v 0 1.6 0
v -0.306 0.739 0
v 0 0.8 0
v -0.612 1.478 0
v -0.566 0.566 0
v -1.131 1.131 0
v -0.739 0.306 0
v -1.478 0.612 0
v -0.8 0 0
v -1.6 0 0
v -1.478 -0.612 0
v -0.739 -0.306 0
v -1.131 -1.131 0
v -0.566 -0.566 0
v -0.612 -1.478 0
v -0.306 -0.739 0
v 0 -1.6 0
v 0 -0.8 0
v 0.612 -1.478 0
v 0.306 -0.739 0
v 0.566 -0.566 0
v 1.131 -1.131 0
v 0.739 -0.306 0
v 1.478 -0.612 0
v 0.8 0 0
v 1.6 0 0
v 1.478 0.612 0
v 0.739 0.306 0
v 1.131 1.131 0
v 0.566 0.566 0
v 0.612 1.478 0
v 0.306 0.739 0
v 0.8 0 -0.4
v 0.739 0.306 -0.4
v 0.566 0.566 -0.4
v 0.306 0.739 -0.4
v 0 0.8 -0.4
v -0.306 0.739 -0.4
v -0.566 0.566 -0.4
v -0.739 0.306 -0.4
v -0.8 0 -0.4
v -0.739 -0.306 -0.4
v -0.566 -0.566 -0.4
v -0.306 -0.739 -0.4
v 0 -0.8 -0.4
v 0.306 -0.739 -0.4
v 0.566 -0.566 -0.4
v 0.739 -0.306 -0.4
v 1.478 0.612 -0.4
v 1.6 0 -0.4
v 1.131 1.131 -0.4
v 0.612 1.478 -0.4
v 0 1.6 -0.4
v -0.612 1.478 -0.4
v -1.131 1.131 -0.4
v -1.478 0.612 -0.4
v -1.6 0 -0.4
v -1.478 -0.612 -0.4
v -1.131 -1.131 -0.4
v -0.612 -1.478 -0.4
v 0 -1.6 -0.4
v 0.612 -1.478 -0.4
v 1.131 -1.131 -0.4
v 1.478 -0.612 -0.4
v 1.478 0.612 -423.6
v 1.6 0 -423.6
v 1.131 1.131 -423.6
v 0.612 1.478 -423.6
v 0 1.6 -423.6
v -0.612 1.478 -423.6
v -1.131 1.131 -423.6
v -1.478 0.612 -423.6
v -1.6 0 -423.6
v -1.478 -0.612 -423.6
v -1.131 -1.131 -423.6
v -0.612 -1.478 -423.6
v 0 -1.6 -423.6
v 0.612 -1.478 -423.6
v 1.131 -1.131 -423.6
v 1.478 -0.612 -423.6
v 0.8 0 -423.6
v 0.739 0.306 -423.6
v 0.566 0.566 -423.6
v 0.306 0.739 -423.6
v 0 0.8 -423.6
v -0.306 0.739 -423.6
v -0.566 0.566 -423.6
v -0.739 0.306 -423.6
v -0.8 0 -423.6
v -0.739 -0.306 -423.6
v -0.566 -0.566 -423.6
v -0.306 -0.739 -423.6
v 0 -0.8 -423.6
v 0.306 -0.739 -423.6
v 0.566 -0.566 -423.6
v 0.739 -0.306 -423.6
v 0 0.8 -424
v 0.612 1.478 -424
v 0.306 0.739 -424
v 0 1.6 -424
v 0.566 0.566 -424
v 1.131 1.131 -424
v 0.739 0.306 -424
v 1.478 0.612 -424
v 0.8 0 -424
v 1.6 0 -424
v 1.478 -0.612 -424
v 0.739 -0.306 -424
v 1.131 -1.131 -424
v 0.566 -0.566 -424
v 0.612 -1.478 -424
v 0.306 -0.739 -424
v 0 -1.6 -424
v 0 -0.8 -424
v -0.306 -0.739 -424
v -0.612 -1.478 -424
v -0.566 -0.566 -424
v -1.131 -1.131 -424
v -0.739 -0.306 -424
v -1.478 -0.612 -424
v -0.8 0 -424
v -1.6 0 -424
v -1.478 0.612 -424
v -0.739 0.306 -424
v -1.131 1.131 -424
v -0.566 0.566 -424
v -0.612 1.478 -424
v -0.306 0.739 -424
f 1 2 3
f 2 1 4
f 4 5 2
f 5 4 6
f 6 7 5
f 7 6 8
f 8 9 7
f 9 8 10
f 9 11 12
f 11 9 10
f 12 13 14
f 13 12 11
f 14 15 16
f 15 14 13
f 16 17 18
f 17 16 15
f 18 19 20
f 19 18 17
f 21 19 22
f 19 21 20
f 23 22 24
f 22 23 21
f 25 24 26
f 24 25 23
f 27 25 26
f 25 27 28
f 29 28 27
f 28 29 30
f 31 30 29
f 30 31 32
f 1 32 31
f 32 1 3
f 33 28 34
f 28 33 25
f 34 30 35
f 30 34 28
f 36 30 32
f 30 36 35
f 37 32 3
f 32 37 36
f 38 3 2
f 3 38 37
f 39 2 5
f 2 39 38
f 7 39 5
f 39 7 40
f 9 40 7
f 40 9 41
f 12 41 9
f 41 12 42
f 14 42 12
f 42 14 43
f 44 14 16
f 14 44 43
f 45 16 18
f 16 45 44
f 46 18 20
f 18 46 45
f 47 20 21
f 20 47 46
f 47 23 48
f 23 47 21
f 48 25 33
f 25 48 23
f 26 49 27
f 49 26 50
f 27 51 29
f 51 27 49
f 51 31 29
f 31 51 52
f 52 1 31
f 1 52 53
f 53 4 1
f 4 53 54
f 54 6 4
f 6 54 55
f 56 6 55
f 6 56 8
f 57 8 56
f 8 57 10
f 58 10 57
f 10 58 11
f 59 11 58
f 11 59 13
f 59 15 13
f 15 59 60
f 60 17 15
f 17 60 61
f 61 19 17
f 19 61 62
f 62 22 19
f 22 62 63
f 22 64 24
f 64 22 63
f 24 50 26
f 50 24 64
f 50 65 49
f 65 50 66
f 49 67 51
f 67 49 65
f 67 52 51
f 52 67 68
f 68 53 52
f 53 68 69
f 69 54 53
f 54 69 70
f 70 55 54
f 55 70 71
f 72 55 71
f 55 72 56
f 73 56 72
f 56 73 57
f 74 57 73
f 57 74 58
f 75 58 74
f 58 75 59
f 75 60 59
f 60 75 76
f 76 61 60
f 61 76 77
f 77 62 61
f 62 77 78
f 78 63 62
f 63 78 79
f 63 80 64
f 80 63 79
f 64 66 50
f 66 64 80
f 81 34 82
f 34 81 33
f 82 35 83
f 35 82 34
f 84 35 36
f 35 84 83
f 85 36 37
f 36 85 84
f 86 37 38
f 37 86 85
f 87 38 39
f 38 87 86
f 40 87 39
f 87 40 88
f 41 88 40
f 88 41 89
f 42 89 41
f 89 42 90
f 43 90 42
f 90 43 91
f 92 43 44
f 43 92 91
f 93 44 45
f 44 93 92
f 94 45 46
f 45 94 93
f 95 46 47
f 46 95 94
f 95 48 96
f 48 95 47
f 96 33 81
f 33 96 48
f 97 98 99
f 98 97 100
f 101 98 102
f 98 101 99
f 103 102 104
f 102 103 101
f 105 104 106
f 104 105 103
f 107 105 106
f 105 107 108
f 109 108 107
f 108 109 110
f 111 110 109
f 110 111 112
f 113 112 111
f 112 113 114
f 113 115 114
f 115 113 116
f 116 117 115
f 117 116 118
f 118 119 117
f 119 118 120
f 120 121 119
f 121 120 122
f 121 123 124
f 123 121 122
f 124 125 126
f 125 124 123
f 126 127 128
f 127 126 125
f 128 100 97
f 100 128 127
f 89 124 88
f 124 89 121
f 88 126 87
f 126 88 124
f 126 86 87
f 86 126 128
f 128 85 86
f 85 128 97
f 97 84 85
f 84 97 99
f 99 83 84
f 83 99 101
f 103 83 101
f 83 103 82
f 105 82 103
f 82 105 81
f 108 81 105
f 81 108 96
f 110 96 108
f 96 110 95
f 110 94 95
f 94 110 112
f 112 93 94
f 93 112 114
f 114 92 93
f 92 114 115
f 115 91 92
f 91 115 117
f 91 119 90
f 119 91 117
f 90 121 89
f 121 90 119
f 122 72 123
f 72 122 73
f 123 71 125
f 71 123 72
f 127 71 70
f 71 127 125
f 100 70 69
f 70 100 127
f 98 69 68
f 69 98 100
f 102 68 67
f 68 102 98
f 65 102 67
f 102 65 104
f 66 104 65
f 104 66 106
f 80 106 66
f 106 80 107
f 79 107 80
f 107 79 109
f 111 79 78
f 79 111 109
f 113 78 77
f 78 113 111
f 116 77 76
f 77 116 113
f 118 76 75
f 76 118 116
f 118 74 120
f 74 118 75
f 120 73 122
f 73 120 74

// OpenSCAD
// file: ../p/4-4ring1.scad
use <../lib.scad>
function ldraw_lib__4_4ring1() = [
// 0 Ring  1 x 1.0
// 0 Name: 4-4ring1.dat
// 0 Author: James Jessiman
// 0 !LDRAW_ORG Primitive UPDATE 2009-01
// 0 !LICENSE Licensed under CC BY 2.0 and CC BY 4.0 : see CAreadme.txt
// 
// 0 BFC CERTIFY CCW
  [0,"BFC","CERTIFY"],
  [0,"BFC","CCW"],
// 
// 0 !HISTORY 1998-12-15 [PTadmin] Official Update 1998-10
// 0 !HISTORY 2002-04-08 [BrickCaster] Modified for BFC compliance
// 0 !HISTORY 2002-04-25 [PTadmin] Official Update 2002-02
// 0 !HISTORY 2007-06-24 [PTadmin] Header formatted for Contributor Agreement
// 0 !HISTORY 2008-07-01 [PTadmin] Official Update 2008-01
// 0 !HISTORY 2008-08-26 [cwdee] Switch polygon winding and rename
// 0 !HISTORY 2009-05-02 [PTadmin] Official Update 2009-01
// 
// 
// 4 16 -0.7654 0 1.8478 -0.3827 0 0.9239 0 0 1 0 0 2
  [4,16,-0.7654,0,1.8478,-0.3827,0,0.9239,0,0,1,0,0,2],
// 4 16 -1.4142 0 1.4142 -0.7071 0 0.7071 -0.3827 0 0.9239 -0.7654 0 1.8478
  [4,16,-1.4142,0,1.4142,-0.7071,0,0.7071,-0.3827,0,0.9239,-0.7654,0,1.8478],
// 4 16 -1.8478 0 0.7654 -0.9239 0 0.3827 -0.7071 0 0.7071 -1.4142 0 1.41420
  [4,16,-1.8478,0,0.7654,-0.9239,0,0.3827,-0.7071,0,0.7071,-1.4142,0,1.41420],
// 4 16 -2 0 0 -1 0 0 -0.9239 0 0.3827 -1.8478 0 0.7654
  [4,16,-2,0,0,-1,0,0,-0.9239,0,0.3827,-1.8478,0,0.7654],
// 4 16 -1.8478 0 -0.7654 -0.9239 0 -0.3827 -1 0 0 -2 0 0
  [4,16,-1.8478,0,-0.7654,-0.9239,0,-0.3827,-1,0,0,-2,0,0],
// 4 16 -1.4142 0 -1.4142 -0.7071 0 -0.7071 -0.9239 0 -0.3827 -1.8478 0 -0.7654
  [4,16,-1.4142,0,-1.4142,-0.7071,0,-0.7071,-0.9239,0,-0.3827,-1.8478,0,-0.7654],
// 4 16 -0.7654 0 -1.8478 -0.3827 0 -0.9239 -0.7071 0 -0.7071 -1.4142 0 -1.4142
  [4,16,-0.7654,0,-1.8478,-0.3827,0,-0.9239,-0.7071,0,-0.7071,-1.4142,0,-1.4142],
// 4 16 0 0 -2 0 0 -1 -0.3827 0 -0.9239 -0.7654 0 -1.8478
  [4,16,0,0,-2,0,0,-1,-0.3827,0,-0.9239,-0.7654,0,-1.8478],
// 4 16 0.7654 0 -1.8478 0.3827 0 -0.9239 0 0 -1 0 0 -2
  [4,16,0.7654,0,-1.8478,0.3827,0,-0.9239,0,0,-1,0,0,-2],
// 4 16 1.4142 0 -1.4142 0.7071 0 -0.7071 0.3827 0 -0.9239 0.7654 0 -1.8478
  [4,16,1.4142,0,-1.4142,0.7071,0,-0.7071,0.3827,0,-0.9239,0.7654,0,-1.8478],
// 4 16 1.8478 0 -0.7654 0.9239 0 -0.3827 0.7071 0 -0.7071 1.4142 0 -1.4142
  [4,16,1.8478,0,-0.7654,0.9239,0,-0.3827,0.7071,0,-0.7071,1.4142,0,-1.4142],
// 4 16 2 0 0 1 0 0 0.9239 0 -0.3827 1.8478 0 -0.7654
  [4,16,2,0,0,1,0,0,0.9239,0,-0.3827,1.8478,0,-0.7654],
// 4 16 1.8478 0 0.7654 0.9239 0 0.3827 1 0 0 2 0 0
  [4,16,1.8478,0,0.7654,0.9239,0,0.3827,1,0,0,2,0,0],
// 4 16 1.4142 0 1.4142 0.7071 0 0.7071 0.9239 0 0.3827 1.8478 0 0.7654
  [4,16,1.4142,0,1.4142,0.7071,0,0.7071,0.9239,0,0.3827,1.8478,0,0.7654],
// 4 16 0.7654 0 1.8478 0.3827 0 0.9239 0.7071 0 0.7071 1.4142 0 1.4142
  [4,16,0.7654,0,1.8478,0.3827,0,0.9239,0.7071,0,0.7071,1.4142,0,1.4142],
// 4 16 0 0 2 0 0 1 0.3827 0 0.9239 0.7654 0 1.8478
  [4,16,0,0,2,0,0,1,0.3827,0,0.9239,0.7654,0,1.8478],
// 0
];
module ldraw_lib__4_4ring1(step=0, col=false, unit=2/5, alt=false, line=0.2, solid=!$preview)
    makepoly(ldraw_lib__4_4ring1(), step=step, col=col, unit=unit, alt=alt, line=line, solid=solid);
ldraw_lib__4_4ring1(line=0.2);
// file: ../p/4-4edge.scad
use <../lib.scad>
function ldraw_lib__4_4edge() = [
// 0 Circle 1.0
// 0 Name: 4-4edge.dat
// 0 Author: James Jessiman
// 0 !LDRAW_ORG Primitive UPDATE 2017-01
// 0 !LICENSE Licensed under CC BY 2.0 and CC BY 4.0 : see CAreadme.txt
// 
// 0 BFC CERTIFY CCW
  [0,"BFC","CERTIFY"],
  [0,"BFC","CCW"],
// 
// 0 !HISTORY 1998-12-15 [PTadmin] Official Update 1998-10
// 0 !HISTORY 2005-12-28 [PTadmin] Official Update 2005-01
// 0 !HISTORY 2007-06-24 [PTadmin] Header formatted for Contributor Agreement
// 0 !HISTORY 2008-07-01 [PTadmin] Official Update 2008-01
// 0 !HISTORY 2017-01-15 [Steffen] BFCed
// 0 !HISTORY 2017-12-30 [PTadmin] Official Update 2017-01
// 
// 
// 2 24 1 0 0 0.9239 0 0.3827
  [2,24,1,0,0,0.9239,0,0.3827],
// 2 24 0.9239 0 0.3827 0.7071 0 0.7071
  [2,24,0.9239,0,0.3827,0.7071,0,0.7071],
// 2 24 0.7071 0 0.7071 0.3827 0 0.9239
  [2,24,0.7071,0,0.7071,0.3827,0,0.9239],
// 2 24 0.3827 0 0.9239 0 0 1
  [2,24,0.3827,0,0.9239,0,0,1],
// 2 24 0 0 1 -0.3827 0 0.9239
  [2,24,0,0,1,-0.3827,0,0.9239],
// 2 24 -0.3827 0 0.9239 -0.7071 0 0.7071
  [2,24,-0.3827,0,0.9239,-0.7071,0,0.7071],
// 2 24 -0.7071 0 0.7071 -0.9239 0 0.3827
  [2,24,-0.7071,0,0.7071,-0.9239,0,0.3827],
// 2 24 -0.9239 0 0.3827 -1 0 -0
  [2,24,-0.9239,0,0.3827,-1,0,-0],
// 2 24 -1 0 -0 -0.9239 0 -0.3827
  [2,24,-1,0,-0,-0.9239,0,-0.3827],
// 2 24 -0.9239 0 -0.3827 -0.7071 0 -0.7071
  [2,24,-0.9239,0,-0.3827,-0.7071,0,-0.7071],
// 2 24 -0.7071 0 -0.7071 -0.3827 0 -0.9239
  [2,24,-0.7071,0,-0.7071,-0.3827,0,-0.9239],
// 2 24 -0.3827 0 -0.9239 0 0 -1
  [2,24,-0.3827,0,-0.9239,0,0,-1],
// 2 24 0 0 -1 0.3827 0 -0.9239
  [2,24,0,0,-1,0.3827,0,-0.9239],
// 2 24 0.3827 0 -0.9239 0.7071 0 -0.7071
  [2,24,0.3827,0,-0.9239,0.7071,0,-0.7071],
// 2 24 0.7071 0 -0.7071 0.9239 0 -0.3827
  [2,24,0.7071,0,-0.7071,0.9239,0,-0.3827],
// 2 24 0.9239 0 -0.3827 1 0 0
  [2,24,0.9239,0,-0.3827,1,0,0],
];
module ldraw_lib__4_4edge(step=0, col=false, unit=2/5, alt=false, line=0.2, solid=!$preview)
    makepoly(ldraw_lib__4_4edge(), step=step, col=col, unit=unit, alt=alt, line=line, solid=solid);
ldraw_lib__4_4edge(line=0.2);
// file: ../p/4-4cyli.scad
use <../lib.scad>
function ldraw_lib__4_4cyli() = [
// 0 Cylinder 1.0
// 0 Name: 4-4cyli.dat
// 0 Author: James Jessiman
// 0 !LDRAW_ORG Primitive UPDATE 2005-01
// 0 !LICENSE Licensed under CC BY 2.0 and CC BY 4.0 : see CAreadme.txt
// 
// 0 BFC CERTIFY CCW
  [0,"BFC","CERTIFY"],
  [0,"BFC","CCW"],
// 
// 0 !HISTORY 1998-12-15 [PTadmin] Official Update 1998-10
// 0 !HISTORY 2002-03-23 [sbliss] Added BFC statement; merged headers from files in distributions LDraw 0.27 and Complete.
// 0 !HISTORY 2002-04-25 [PTadmin] Official Update 2002-02
// 0 !HISTORY 2004-12-14 [guyvivan] BFC CCW
// 0 !HISTORY 2005-12-28 [PTadmin] Official Update 2005-01
// 0 !HISTORY 2007-06-24 [PTadmin] Header formatted for Contributor Agreement
// 0 !HISTORY 2008-07-01 [PTadmin] Official Update 2008-01
// 
// 
// 4 16 1 1 0 0.9239 1 0.3827 0.9239 0 0.3827 1 0 0
  [4,16,1,1,0,0.9239,1,0.3827,0.9239,0,0.3827,1,0,0],
// 5 24 1 0 0 1 1 0 0.9239 0 0.3827 0.9239 0 -0.3827
  [5,24,1,0,0,1,1,0,0.9239,0,0.3827,0.9239,0,-0.3827],
// 4 16 0.9239 1 0.3827 0.7071 1 0.7071 0.7071 0 0.7071 0.9239 0 0.3827
  [4,16,0.9239,1,0.3827,0.7071,1,0.7071,0.7071,0,0.7071,0.9239,0,0.3827],
// 5 24 0.9239 0 0.3827 0.9239 1 0.3827 0.7071 0 0.7071 1 0 0
  [5,24,0.9239,0,0.3827,0.9239,1,0.3827,0.7071,0,0.7071,1,0,0],
// 4 16 0.7071 1 0.7071 0.3827 1 0.9239 0.3827 0 0.9239 0.7071 0 0.7071
  [4,16,0.7071,1,0.7071,0.3827,1,0.9239,0.3827,0,0.9239,0.7071,0,0.7071],
// 5 24 0.7071 0 0.7071 0.7071 1 0.7071 0.3827 0 0.9239 0.9239 0 0.3827
  [5,24,0.7071,0,0.7071,0.7071,1,0.7071,0.3827,0,0.9239,0.9239,0,0.3827],
// 4 16 0.3827 1 0.9239 0 1 1 0 0 1 0.3827 0 0.9239
  [4,16,0.3827,1,0.9239,0,1,1,0,0,1,0.3827,0,0.9239],
// 5 24 0.3827 0 0.9239 0.3827 1 0.9239 0 0 1 0.7071 0 0.7071
  [5,24,0.3827,0,0.9239,0.3827,1,0.9239,0,0,1,0.7071,0,0.7071],
// 4 16 0 1 1 -0.3827 1 0.9239 -0.3827 0 0.9239 0 0 1
  [4,16,0,1,1,-0.3827,1,0.9239,-0.3827,0,0.9239,0,0,1],
// 5 24 0 0 1 0 1 1 -0.3827 0 0.9239 0.3827 0 0.9239
  [5,24,0,0,1,0,1,1,-0.3827,0,0.9239,0.3827,0,0.9239],
// 4 16 -0.3827 1 0.9239 -0.7071 1 0.7071 -0.7071 0 0.7071 -0.3827 0 0.9239
  [4,16,-0.3827,1,0.9239,-0.7071,1,0.7071,-0.7071,0,0.7071,-0.3827,0,0.9239],
// 5 24 -0.3827 0 0.9239 -0.3827 1 0.9239 -0.7071 0 0.7071 0 0 1
  [5,24,-0.3827,0,0.9239,-0.3827,1,0.9239,-0.7071,0,0.7071,0,0,1],
// 4 16 -0.7071 1 0.7071 -0.9239 1 0.3827 -0.9239 0 0.3827 -0.7071 0 0.7071
  [4,16,-0.7071,1,0.7071,-0.9239,1,0.3827,-0.9239,0,0.3827,-0.7071,0,0.7071],
// 5 24 -0.7071 0 0.7071 -0.7071 1 0.7071 -0.9239 0 0.3827 -0.3827 0 0.9239
  [5,24,-0.7071,0,0.7071,-0.7071,1,0.7071,-0.9239,0,0.3827,-0.3827,0,0.9239],
// 4 16 -0.9239 1 0.3827 -1 1 0 -1 0 0 -0.9239 0 0.3827
  [4,16,-0.9239,1,0.3827,-1,1,0,-1,0,0,-0.9239,0,0.3827],
// 5 24 -0.9239 0 0.3827 -0.9239 1 0.3827 -1 0 0 -0.7071 0 0.7071
  [5,24,-0.9239,0,0.3827,-0.9239,1,0.3827,-1,0,0,-0.7071,0,0.7071],
// 4 16 -1 1 0 -0.9239 1 -0.3827 -0.9239 0 -0.3827 -1 0 0
  [4,16,-1,1,0,-0.9239,1,-0.3827,-0.9239,0,-0.3827,-1,0,0],
// 5 24 -1 0 0 -1 1 0 -0.9239 0 -0.3827 -0.9239 0 0.3827
  [5,24,-1,0,0,-1,1,0,-0.9239,0,-0.3827,-0.9239,0,0.3827],
// 4 16 -0.9239 1 -0.3827 -0.7071 1 -0.7071 -0.7071 0 -0.7071 -0.9239 0 -0.3827
  [4,16,-0.9239,1,-0.3827,-0.7071,1,-0.7071,-0.7071,0,-0.7071,-0.9239,0,-0.3827],
// 5 24 -0.9239 0 -0.3827 -0.9239 1 -0.3827 -0.7071 0 -0.7071 -1 0 0
  [5,24,-0.9239,0,-0.3827,-0.9239,1,-0.3827,-0.7071,0,-0.7071,-1,0,0],
// 4 16 -0.7071 1 -0.7071 -0.3827 1 -0.9239 -0.3827 0 -0.9239 -0.7071 0 -0.7071
  [4,16,-0.7071,1,-0.7071,-0.3827,1,-0.9239,-0.3827,0,-0.9239,-0.7071,0,-0.7071],
// 5 24 -0.7071 0 -0.7071 -0.7071 1 -0.7071 -0.3827 0 -0.9239 -0.9239 0 -0.3827
  [5,24,-0.7071,0,-0.7071,-0.7071,1,-0.7071,-0.3827,0,-0.9239,-0.9239,0,-0.3827],
// 4 16 -0.3827 1 -0.9239 0 1 -1 0 0 -1 -0.3827 0 -0.9239
  [4,16,-0.3827,1,-0.9239,0,1,-1,0,0,-1,-0.3827,0,-0.9239],
// 5 24 -0.3827 0 -0.9239 -0.3827 1 -0.9239 0 0 -1 -0.7071 0 -0.7071
  [5,24,-0.3827,0,-0.9239,-0.3827,1,-0.9239,0,0,-1,-0.7071,0,-0.7071],
// 4 16 0 1 -1 0.3827 1 -0.9239 0.3827 0 -0.9239 0 0 -1
  [4,16,0,1,-1,0.3827,1,-0.9239,0.3827,0,-0.9239,0,0,-1],
// 5 24 0 0 -1 0 1 -1 0.3827 0 -0.9239 -0.3827 0 -0.9239
  [5,24,0,0,-1,0,1,-1,0.3827,0,-0.9239,-0.3827,0,-0.9239],
// 4 16 0.3827 1 -0.9239 0.7071 1 -0.7071 0.7071 0 -0.7071 0.3827 0 -0.9239
  [4,16,0.3827,1,-0.9239,0.7071,1,-0.7071,0.7071,0,-0.7071,0.3827,0,-0.9239],
// 5 24 0.3827 0 -0.9239 0.3827 1 -0.9239 0.7071 0 -0.7071 0 0 -1
  [5,24,0.3827,0,-0.9239,0.3827,1,-0.9239,0.7071,0,-0.7071,0,0,-1],
// 4 16 0.7071 1 -0.7071 0.9239 1 -0.3827 0.9239 0 -0.3827 0.7071 0 -0.7071
  [4,16,0.7071,1,-0.7071,0.9239,1,-0.3827,0.9239,0,-0.3827,0.7071,0,-0.7071],
// 5 24 0.7071 0 -0.7071 0.7071 1 -0.7071 0.9239 0 -0.3827 0.3827 0 -0.9239
  [5,24,0.7071,0,-0.7071,0.7071,1,-0.7071,0.9239,0,-0.3827,0.3827,0,-0.9239],
// 4 16 0.9239 1 -0.3827 1 1 0 1 0 0 0.9239 0 -0.3827
  [4,16,0.9239,1,-0.3827,1,1,0,1,0,0,0.9239,0,-0.3827],
// 5 24 0.9239 0 -0.3827 0.9239 1 -0.3827 1 0 0 0.7071 0 -0.7071
  [5,24,0.9239,0,-0.3827,0.9239,1,-0.3827,1,0,0,0.7071,0,-0.7071],
// 0
];
module ldraw_lib__4_4cyli(step=0, col=false, unit=2/5, alt=false, line=0.2, solid=!$preview)
    makepoly(ldraw_lib__4_4cyli(), step=step, col=col, unit=unit, alt=alt, line=line, solid=solid);
ldraw_lib__4_4cyli(line=0.2);
// file: u9053.scad
use <../lib.scad>
use <../p/4-4cyli.scad>
use <../p/4-4edge.scad>
use <../p/4-4ring1.scad>
function ldraw_lib__u9053() = [
// 0 ~Technic Flex-System Hose End
// 0 Name: u9053.dat
// 0 Author: William Howard [WilliamH]
// 0 !LDRAW_ORG Part UPDATE 2011-02
// 0 !LICENSE Licensed under CC BY 2.0 and CC BY 4.0 : see CAreadme.txt
// 
// 0 BFC CERTIFY CCW
  [0,"BFC","CERTIFY"],
  [0,"BFC","CCW"],
// 
// 0 !HISTORY 2011-12-21 [cwdee] Reworked subparting technique
// 0 !HISTORY 2011-12-23 [PTadmin] Renamed from 76
// 0 !HISTORY 2011-12-29 [PTadmin] Official Update 2011-02
// 
// 
// 1 16 0 0 0 2 0 0 0 1 0 0 0 2 4-4ring1.dat
  [1,16,0,0,0,2,0,0,0,1,0,0,0,2, ldraw_lib__4_4ring1()],
// 1 16 0 0 0 2 0 0 0 1 0 0 0 2 4-4edge.dat
  [1,16,0,0,0,2,0,0,0,1,0,0,0,2, ldraw_lib__4_4edge()],
// 0 BFC INVERTNEXT
  [0,"BFC","INVERTNEXT"],
// 1 16 0 0 0 2 0 0 0 1 0 0 0 2 4-4cyli.dat
  [1,16,0,0,0,2,0,0,0,1,0,0,0,2, ldraw_lib__4_4cyli()],
// 1 16 0 0 0 4 0 0 0 1 0 0 0 4 4-4edge.dat
  [1,16,0,0,0,4,0,0,0,1,0,0,0,4, ldraw_lib__4_4edge()],
// 1 16 0 0 0 4 0 0 0 1 0 0 0 4 4-4cyli.dat
  [1,16,0,0,0,4,0,0,0,1,0,0,0,4, ldraw_lib__4_4cyli()],
// 0
];
module ldraw_lib__u9053(step=0, col=false, unit=2/5, alt=false, line=0.2, solid=!$preview)
    makepoly(ldraw_lib__u9053(), step=step, col=col, unit=unit, alt=alt, line=line, solid=solid);
ldraw_lib__u9053(line=0.2);
// file: 77.scad
use <../lib.scad>
use <../p/4-4cyli.scad>
function ldraw_lib__77() = [
// 0 ~Technic Flex-System Hose Segment
// 0 Name: 77.dat
// 0 Author: William Howard [WilliamH]
// 0 !LDRAW_ORG Part UPDATE 2011-02
// 0 !LICENSE Licensed under CC BY 2.0 and CC BY 4.0 : see CAreadme.txt
// 
// 0 BFC CERTIFY CCW
  [0,"BFC","CERTIFY"],
  [0,"BFC","CCW"],
// 
// 0 !HISTORY 2011-12-21 [cwdee] Reworked subparting technique
// 0 !HISTORY 2011-12-29 [PTadmin] Official Update 2011-02
// 
// 
// 1 16 0 0 0 4 0 0 0 1 0 0 0 4 4-4cyli.dat
  [1,16,0,0,0,4,0,0,0,1,0,0,0,4, ldraw_lib__4_4cyli()],
// 0 BFC INVERTNEXT
  [0,"BFC","INVERTNEXT"],
// 1 16 0 0 0 2 0 0 0 1 0 0 0 2 4-4cyli.dat
  [1,16,0,0,0,2,0,0,0,1,0,0,0,2, ldraw_lib__4_4cyli()],
// 0
];
module ldraw_lib__77(step=0, col=false, unit=2/5, alt=false, line=0.2, solid=!$preview)
    makepoly(ldraw_lib__77(), step=step, col=col, unit=unit, alt=alt, line=line, solid=solid);
ldraw_lib__77(line=0.2);
// main file
use <../lib.scad>
use <77.scad>
use <u9053.scad>
function ldraw_lib__22296() = [
// 0 Technic Flex-System Hose 53L (1060LDU)
// 0 Name: 22296.dat
// 0 Author: Tim Gould [timgould]
// 0 !LDRAW_ORG Part UPDATE 2011-02
// 0 !LICENSE Licensed under CC BY 2.0 and CC BY 4.0 : see CAreadme.txt
// 
// 0 BFC CERTIFY CCW
  [0,"BFC","CERTIFY"],
  [0,"BFC","CCW"],
// 
// 0 !KEYWORDS bar, tube
// 
// 0 !HISTORY 2011-12-29 [PTadmin] Official Update 2011-02
// 
// 
// 1 16 0 0 0 1 0 0 0 1 0 0 0 1 u9053.dat
  [1,16,0,0,0,1,0,0,0,1,0,0,0,1, ldraw_lib__u9053()],
// 1 16 0 1 0 1 0 0 0 1058 0 0 0 1 77.dat
  [1,16,0,1,0,1,0,0,0,1058,0,0,0,1, ldraw_lib__77()],
// 1 16 0 1060 0 -1 0 0 0 -1 0 0 0 1 u9053.dat
  [1,16,0,1060,0,-1,0,0,0,-1,0,0,0,1, ldraw_lib__u9053()],
];
module ldraw_lib__22296(step=0, col=false, unit=2/5, alt=false, line=0.2, solid=!$preview)
    makepoly(ldraw_lib__22296(), step=step, col=col, unit=unit, alt=alt, line=line, solid=solid);
ldraw_lib__22296(line=0.2);
